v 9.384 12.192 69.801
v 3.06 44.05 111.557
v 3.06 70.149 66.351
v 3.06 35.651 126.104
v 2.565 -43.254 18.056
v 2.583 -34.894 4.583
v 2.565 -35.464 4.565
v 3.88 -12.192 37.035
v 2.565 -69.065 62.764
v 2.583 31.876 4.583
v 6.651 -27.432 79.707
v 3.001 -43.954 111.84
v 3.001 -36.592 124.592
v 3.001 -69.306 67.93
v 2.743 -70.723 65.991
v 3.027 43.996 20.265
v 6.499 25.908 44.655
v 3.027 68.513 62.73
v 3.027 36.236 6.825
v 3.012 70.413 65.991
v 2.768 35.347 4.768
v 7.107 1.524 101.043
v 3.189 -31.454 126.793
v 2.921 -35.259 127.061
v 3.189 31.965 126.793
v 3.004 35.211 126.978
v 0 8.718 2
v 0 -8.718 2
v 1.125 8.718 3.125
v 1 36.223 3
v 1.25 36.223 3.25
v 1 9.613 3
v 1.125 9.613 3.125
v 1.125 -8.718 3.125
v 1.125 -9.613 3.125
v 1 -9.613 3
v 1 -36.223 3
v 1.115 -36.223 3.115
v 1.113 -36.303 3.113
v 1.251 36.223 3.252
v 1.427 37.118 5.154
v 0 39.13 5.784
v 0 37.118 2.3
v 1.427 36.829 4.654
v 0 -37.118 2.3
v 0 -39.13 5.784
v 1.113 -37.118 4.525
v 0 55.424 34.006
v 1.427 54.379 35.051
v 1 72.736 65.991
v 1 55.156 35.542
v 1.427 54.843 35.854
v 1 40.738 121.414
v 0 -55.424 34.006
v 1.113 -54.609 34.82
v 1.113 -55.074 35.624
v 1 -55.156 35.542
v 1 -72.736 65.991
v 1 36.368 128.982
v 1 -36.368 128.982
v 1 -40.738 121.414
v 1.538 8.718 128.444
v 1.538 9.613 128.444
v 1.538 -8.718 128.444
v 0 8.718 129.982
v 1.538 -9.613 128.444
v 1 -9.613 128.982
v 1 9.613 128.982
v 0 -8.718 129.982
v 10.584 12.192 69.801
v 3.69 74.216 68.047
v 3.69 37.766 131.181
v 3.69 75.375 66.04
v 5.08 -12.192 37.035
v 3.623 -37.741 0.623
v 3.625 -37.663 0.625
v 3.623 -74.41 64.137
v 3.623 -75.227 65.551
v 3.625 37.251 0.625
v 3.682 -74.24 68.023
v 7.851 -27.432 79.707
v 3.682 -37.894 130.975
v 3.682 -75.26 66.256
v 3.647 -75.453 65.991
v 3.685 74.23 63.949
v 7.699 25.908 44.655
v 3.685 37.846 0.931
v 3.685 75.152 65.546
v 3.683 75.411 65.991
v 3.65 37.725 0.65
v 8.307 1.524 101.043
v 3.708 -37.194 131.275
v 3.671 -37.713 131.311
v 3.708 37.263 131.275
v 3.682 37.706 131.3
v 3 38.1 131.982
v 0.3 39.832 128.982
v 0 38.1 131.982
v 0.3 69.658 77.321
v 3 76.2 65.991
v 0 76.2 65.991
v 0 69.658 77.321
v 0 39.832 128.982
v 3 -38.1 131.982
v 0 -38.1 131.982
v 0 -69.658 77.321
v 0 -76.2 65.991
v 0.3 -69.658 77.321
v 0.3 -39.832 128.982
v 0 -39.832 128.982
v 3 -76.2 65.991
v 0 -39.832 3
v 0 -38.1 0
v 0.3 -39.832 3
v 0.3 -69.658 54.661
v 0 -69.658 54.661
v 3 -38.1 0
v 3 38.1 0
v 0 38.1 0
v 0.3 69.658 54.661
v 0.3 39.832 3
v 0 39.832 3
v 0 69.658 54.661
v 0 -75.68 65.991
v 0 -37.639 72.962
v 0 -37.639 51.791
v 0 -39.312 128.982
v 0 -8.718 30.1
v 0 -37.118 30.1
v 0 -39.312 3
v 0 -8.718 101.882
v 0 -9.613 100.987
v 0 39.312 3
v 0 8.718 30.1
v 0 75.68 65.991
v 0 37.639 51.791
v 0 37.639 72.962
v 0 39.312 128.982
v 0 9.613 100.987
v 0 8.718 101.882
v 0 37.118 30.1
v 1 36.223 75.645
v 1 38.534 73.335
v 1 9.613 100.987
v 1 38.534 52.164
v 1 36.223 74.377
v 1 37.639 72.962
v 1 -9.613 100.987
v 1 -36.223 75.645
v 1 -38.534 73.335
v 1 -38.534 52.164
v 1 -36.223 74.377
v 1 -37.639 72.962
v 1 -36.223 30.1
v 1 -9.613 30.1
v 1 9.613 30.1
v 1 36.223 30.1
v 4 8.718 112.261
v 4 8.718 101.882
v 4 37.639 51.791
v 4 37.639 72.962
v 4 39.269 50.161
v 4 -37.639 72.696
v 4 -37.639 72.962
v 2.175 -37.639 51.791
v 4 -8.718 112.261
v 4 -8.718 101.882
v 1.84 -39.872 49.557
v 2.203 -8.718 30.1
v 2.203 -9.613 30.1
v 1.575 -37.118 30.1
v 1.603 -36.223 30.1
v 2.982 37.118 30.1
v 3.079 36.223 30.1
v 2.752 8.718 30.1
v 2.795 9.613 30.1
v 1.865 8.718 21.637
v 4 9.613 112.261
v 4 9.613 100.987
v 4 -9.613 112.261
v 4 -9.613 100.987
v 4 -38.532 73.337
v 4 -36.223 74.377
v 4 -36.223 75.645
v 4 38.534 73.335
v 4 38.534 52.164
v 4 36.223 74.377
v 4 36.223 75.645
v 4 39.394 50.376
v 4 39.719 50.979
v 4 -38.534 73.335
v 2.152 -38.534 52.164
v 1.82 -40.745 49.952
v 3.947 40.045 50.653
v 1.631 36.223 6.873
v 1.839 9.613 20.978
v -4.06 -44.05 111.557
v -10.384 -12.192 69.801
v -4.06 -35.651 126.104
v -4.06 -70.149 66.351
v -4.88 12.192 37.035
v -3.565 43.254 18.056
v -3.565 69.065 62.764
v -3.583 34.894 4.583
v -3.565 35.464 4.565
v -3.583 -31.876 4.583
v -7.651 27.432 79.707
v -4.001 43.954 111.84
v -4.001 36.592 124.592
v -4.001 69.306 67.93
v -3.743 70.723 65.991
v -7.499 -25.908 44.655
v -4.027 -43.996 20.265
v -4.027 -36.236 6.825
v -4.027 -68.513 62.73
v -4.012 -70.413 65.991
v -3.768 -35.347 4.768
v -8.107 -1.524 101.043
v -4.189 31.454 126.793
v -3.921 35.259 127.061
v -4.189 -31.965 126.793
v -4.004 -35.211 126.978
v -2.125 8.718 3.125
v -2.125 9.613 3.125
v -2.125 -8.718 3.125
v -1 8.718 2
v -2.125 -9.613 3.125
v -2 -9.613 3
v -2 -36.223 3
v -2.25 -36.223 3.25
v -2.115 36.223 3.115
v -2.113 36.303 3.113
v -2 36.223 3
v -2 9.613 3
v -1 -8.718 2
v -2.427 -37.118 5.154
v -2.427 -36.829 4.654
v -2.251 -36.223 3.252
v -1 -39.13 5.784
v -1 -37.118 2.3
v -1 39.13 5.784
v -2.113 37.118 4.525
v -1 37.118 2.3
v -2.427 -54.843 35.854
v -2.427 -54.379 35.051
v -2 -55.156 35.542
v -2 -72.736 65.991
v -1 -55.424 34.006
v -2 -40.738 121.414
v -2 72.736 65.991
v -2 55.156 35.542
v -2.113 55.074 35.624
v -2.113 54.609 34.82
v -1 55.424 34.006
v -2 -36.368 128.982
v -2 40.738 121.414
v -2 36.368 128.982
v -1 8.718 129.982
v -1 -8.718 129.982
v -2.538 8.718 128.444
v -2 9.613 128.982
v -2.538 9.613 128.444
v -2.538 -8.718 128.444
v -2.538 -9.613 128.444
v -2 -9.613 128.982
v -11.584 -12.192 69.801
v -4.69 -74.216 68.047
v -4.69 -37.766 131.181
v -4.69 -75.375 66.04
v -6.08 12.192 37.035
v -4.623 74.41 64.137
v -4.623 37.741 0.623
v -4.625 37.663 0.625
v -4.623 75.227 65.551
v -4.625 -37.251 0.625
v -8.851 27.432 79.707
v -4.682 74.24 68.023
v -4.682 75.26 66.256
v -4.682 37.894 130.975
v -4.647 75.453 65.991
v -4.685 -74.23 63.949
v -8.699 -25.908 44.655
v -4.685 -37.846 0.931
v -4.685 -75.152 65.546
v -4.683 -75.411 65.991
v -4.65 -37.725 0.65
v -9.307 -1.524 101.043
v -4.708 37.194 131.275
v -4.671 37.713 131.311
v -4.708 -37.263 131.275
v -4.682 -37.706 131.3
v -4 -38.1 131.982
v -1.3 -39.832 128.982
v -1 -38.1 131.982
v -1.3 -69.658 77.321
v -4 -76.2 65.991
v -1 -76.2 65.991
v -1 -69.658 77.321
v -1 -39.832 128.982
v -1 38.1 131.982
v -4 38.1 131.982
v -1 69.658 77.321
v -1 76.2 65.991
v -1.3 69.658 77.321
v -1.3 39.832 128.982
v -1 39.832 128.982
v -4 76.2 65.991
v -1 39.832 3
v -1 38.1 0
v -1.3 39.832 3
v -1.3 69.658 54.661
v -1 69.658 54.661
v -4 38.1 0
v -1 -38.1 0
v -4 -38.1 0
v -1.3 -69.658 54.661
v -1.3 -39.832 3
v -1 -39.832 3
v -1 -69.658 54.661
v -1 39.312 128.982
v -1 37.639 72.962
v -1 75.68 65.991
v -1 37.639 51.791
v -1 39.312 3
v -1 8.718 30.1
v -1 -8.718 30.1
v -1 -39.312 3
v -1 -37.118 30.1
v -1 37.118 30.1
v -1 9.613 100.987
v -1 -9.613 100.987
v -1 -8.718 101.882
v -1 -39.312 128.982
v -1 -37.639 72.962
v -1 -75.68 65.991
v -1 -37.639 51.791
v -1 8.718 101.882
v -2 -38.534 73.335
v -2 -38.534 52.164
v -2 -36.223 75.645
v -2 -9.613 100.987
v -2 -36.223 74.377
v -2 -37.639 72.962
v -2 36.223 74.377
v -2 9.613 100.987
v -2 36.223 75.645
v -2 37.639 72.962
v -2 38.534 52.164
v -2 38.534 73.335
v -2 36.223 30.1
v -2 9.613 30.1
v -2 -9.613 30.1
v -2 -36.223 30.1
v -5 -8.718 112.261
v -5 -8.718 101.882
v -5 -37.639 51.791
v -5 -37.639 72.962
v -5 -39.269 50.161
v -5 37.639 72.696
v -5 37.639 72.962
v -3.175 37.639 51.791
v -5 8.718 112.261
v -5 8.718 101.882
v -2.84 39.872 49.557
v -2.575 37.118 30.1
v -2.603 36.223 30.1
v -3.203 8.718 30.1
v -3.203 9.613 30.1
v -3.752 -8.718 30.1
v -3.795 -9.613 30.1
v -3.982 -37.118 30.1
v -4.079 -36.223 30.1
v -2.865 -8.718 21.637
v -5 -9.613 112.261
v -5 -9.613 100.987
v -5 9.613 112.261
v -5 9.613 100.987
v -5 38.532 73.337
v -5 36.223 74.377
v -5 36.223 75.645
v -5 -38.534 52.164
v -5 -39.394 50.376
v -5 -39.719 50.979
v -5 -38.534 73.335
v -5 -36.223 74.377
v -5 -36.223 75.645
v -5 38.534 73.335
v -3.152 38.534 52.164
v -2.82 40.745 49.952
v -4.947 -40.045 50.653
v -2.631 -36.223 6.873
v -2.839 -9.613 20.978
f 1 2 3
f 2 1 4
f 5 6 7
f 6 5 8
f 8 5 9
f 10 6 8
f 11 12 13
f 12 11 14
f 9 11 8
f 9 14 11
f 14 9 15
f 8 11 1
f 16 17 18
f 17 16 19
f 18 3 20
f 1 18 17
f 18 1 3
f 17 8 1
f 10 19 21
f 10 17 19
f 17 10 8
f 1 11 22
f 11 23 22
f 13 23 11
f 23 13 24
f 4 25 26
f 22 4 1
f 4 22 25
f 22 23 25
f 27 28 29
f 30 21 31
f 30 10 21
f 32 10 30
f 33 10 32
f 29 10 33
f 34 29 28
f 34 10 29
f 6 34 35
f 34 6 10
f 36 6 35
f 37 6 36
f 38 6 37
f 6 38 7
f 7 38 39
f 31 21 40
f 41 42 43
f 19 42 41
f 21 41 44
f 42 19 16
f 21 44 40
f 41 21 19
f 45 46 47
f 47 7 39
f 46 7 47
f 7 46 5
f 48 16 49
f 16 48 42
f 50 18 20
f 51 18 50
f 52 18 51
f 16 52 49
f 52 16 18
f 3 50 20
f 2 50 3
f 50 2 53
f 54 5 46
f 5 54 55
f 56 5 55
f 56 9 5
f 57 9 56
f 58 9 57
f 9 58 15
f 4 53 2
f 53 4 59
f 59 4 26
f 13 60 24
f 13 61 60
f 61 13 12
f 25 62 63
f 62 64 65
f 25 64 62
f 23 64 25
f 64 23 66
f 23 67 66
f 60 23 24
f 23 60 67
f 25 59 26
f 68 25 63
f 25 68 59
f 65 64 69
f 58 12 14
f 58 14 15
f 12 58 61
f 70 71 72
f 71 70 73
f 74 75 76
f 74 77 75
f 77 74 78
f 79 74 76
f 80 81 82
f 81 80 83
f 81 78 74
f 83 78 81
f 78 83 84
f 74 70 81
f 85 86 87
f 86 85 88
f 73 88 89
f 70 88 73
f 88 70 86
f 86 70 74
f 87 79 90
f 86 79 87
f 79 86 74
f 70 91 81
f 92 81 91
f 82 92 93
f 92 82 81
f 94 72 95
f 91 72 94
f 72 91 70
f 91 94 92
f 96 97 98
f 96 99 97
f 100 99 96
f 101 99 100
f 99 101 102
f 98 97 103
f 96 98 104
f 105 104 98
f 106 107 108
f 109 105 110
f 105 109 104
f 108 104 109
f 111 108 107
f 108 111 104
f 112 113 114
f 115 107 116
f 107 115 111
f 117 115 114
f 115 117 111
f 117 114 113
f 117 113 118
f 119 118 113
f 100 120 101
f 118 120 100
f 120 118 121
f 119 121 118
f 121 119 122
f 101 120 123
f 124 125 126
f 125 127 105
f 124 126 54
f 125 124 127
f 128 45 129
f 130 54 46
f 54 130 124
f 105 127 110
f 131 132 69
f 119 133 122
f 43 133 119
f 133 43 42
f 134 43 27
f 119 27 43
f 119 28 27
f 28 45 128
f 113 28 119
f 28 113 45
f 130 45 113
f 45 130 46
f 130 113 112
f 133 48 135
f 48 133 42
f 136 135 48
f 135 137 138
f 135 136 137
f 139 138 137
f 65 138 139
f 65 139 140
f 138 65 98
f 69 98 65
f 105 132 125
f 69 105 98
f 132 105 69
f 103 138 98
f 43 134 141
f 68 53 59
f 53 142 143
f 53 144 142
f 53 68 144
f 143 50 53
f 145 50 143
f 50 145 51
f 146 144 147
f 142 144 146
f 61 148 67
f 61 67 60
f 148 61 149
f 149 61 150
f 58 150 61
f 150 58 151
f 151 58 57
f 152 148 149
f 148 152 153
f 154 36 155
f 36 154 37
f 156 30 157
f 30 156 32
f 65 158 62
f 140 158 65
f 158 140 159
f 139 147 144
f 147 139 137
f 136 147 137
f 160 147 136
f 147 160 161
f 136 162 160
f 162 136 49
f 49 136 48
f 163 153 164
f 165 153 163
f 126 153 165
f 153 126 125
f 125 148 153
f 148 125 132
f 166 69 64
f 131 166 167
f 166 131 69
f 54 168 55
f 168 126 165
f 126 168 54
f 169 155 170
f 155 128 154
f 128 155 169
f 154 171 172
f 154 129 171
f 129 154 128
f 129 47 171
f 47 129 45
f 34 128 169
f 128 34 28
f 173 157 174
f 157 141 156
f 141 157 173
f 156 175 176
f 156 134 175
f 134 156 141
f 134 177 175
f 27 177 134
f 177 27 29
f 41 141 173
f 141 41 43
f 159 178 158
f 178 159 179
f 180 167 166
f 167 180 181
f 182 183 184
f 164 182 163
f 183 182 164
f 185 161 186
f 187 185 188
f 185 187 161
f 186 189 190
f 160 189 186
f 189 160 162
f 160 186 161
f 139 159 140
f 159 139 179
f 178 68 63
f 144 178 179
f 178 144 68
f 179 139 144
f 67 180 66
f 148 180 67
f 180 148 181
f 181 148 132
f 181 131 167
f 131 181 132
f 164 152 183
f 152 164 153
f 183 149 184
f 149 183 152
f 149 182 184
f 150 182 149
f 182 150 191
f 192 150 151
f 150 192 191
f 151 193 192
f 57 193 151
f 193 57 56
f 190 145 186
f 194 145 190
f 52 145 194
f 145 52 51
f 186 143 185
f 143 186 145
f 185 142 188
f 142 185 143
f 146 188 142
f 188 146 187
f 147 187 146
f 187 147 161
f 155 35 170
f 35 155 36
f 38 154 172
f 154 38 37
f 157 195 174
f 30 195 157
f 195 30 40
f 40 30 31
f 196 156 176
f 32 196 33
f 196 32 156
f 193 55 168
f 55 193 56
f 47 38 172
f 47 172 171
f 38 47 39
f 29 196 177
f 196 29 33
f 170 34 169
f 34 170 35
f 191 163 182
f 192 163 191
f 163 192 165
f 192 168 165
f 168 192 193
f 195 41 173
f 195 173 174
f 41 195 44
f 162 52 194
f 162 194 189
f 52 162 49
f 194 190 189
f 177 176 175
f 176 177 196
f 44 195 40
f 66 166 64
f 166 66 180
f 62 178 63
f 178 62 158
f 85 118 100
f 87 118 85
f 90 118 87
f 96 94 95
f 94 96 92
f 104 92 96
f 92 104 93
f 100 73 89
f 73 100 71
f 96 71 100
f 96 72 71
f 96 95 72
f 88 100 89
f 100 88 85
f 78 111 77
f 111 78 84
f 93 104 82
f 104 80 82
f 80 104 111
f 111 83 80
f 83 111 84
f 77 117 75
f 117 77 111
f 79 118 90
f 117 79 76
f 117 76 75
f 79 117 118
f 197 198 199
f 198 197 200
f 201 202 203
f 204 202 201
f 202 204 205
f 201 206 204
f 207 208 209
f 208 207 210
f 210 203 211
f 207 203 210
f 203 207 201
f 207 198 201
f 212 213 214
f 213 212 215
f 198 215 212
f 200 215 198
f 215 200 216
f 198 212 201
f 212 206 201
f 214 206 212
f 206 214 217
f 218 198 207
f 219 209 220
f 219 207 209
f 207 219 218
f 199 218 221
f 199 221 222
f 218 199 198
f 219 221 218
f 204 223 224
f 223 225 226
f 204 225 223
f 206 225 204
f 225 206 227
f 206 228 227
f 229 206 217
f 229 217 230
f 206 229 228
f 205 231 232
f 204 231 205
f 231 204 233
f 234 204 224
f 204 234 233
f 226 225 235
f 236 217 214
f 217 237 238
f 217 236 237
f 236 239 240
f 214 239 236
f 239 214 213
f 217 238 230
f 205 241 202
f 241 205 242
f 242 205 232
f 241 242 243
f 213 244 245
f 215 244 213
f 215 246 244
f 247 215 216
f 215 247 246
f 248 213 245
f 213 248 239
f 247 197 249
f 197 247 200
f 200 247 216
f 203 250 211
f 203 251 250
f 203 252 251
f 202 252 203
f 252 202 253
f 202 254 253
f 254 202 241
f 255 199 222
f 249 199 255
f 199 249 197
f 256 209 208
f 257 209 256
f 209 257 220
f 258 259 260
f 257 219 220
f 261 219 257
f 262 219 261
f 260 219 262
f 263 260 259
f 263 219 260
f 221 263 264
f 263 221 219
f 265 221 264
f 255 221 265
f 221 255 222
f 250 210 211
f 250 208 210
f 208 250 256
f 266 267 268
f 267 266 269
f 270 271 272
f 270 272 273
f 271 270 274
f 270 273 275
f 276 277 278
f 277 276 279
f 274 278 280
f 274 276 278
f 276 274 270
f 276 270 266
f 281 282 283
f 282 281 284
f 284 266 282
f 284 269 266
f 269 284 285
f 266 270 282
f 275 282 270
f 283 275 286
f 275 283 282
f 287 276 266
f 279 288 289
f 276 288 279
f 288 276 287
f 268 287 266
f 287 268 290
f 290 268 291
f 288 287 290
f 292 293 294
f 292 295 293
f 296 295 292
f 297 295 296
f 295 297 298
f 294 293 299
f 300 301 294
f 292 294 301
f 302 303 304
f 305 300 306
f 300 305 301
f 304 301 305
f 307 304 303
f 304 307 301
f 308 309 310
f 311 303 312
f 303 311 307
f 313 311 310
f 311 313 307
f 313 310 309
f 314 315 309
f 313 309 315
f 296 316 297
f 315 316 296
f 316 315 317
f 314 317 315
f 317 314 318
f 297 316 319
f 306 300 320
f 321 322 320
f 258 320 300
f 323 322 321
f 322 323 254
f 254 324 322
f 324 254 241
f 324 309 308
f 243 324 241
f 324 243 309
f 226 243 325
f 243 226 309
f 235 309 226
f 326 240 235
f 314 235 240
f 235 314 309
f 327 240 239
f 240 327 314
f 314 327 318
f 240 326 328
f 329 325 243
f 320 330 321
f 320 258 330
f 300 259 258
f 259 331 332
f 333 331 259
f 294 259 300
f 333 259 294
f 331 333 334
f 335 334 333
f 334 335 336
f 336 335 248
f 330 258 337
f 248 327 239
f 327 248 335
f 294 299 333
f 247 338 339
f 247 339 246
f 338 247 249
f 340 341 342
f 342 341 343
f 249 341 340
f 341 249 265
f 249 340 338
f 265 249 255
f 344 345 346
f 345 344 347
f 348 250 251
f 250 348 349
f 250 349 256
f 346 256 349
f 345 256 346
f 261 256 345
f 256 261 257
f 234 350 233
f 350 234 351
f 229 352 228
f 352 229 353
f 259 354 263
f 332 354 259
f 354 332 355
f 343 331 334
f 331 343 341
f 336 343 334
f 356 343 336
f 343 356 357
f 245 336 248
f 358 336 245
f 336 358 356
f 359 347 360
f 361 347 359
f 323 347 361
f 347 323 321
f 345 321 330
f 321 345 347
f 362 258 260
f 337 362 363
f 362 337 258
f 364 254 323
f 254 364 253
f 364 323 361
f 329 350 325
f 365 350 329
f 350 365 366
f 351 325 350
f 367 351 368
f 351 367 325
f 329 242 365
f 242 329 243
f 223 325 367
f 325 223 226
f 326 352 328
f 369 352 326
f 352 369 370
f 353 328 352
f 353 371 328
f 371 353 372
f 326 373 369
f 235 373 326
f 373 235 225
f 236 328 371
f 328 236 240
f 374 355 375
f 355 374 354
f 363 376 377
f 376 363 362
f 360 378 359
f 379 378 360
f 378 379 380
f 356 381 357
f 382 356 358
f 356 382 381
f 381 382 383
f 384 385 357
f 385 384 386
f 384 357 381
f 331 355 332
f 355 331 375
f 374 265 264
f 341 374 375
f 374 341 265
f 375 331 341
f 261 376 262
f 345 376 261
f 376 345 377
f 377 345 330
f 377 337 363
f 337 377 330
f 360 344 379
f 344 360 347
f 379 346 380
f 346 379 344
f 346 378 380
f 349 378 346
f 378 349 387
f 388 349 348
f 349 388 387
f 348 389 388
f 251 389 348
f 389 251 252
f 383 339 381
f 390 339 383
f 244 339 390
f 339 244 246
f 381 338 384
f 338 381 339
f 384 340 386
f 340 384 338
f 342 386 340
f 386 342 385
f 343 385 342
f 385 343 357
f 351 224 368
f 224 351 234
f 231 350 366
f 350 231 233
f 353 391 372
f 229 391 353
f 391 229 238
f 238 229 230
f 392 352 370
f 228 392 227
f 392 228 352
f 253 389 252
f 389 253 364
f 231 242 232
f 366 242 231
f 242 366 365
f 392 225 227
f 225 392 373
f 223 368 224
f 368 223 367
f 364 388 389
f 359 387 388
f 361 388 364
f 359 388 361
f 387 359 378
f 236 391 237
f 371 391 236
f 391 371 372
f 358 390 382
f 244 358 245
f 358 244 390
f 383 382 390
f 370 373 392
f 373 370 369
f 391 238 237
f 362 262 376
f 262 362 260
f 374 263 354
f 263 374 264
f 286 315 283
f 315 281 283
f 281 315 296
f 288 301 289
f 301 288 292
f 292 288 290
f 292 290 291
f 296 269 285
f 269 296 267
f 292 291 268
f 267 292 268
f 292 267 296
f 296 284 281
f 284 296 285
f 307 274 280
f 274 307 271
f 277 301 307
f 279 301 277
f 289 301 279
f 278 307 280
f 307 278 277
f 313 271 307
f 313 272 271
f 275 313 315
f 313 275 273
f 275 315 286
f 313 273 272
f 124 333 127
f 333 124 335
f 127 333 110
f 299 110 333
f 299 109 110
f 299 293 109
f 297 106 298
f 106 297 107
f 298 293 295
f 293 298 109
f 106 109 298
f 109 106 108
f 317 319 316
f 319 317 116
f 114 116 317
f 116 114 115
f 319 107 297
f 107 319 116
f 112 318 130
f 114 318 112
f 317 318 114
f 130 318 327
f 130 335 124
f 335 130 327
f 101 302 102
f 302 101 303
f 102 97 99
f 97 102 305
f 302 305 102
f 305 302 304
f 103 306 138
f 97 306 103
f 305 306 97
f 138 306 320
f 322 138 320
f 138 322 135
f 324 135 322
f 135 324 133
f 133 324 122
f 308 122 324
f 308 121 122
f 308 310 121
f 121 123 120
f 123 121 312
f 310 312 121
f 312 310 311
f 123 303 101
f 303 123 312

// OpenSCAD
// Hexagon wall tile v48 — parametric rebuild of v30
// Front: identical low-poly facets to v30 (same facet angles at every size).
// Edge profile: identical on every size (edge depth, rim width) so tiles butt flush.
// Back: six corner pads for 1" (25 mm) double-sided mounting tape.
// v32: tape pads are flat plates hung from the rim with an air gap to the front skin.
// v33: thinner skin + thinner pads so the air gap is 1.4 mm even right at the edges
//      (v32 had only 0.8 mm there and showed marks along the slanted edges).
// v34: snap-off stabilizer fins behind the bottom edge so the tall, thin tile can't tip over
//      while printing. Break them off afterwards (bend sideways) and the back stays flat.
// v35: 0.6 mm 45° chamfer on the front edge (crisp, consistent shadow line between tiles; hides
//      first-layer squish and brim trim marks) + relief_scale to deepen the facets if wanted.
// v37: much smaller breakaway tabs (0.8 x 0.6 mm, every 8 mm) so the fins snap off easily.
// v38: full-height snap-off BRACE FRAME behind the tile: a thin hex ring + X/vertical bars,
//      1 mm behind the back, tied to the tile rim by tiny tabs all the way round (incl. the top).
//      Tile + brace act as a stiff box while printing; the fins now sit on the brace.
//      Peel the brace off after printing — the tabs only touch the back rim.
// v39: PAIR mode (default): two identical tiles printed back-to-back, 0.4 mm apart, so each
//      cradles the other full-height. Only 12 tiny tabs (corners + mid-sides) join the back
//      rims — twist/peel the tiles apart. No brace, no fins, almost no waste. The pair is
//      turned 90° on the bed so the 'back' seam lands on a side edge, not on either face.
// v40: pair tabs spaced evenly every ~pair_tab_pitch mm round the rim on EVERY size. In v39 the
//      tab spacing grew with the tile (3": ~23 mm max gap, 6": ~46 mm, 10": ~79 mm), so the 3" pair
//      printed perfectly but the 6" rims flexed apart between tabs and broke up above mid-height.
//      Now every size has the same tab spacing as a stiff 3" pair (or tighter).
// v42: tabs replaced by one continuous hairline SEAM round the outer edge of the pair gap.
//      Discrete tabs changed the toolpath on every layer that had a tab, leaving a faint line
//      across the tile every ~10 mm of height. With a continuous seam every layer has the same
//      shape, so there is nothing to print differently. Separate the tiles by running a utility
//      knife along the seam line on the edges, then twist apart.
// v43: stiffer tape pads — each pad now grows from the back plane toward the front until it is
//      pad_gap (1.4 mm) from the skin, instead of being a 1 mm plate (the skin stays untouched, so
//      no ghost lines). Larger tiles (>= mid_pad_min_in)
//      get four extra pads at the slanted mid-edges: 10 tape spots on the 10".
// v44: UNIFORM pads. Every pad is the same PAD x PAD tape square, pushed snug into its corner
//      (touching both rims), with only a small 45° gusset beneath it down to the rim so it prints
//      without support. Because a hex corner is the same angle at every size, the 6" and 10" pads
//      are identical in shape and size; the 3" uses the same layout with smaller squares.
//      The 10" adds the same square at the middle of each slanted edge.
// v46: pads are a 1 mm plate with a stiffening LIP round the free edges (like a shallow tray),
//      instead of solid-filled — nearly the stiffness of v44's deep pads at close to v42 print time.
// v47: pair gap 0.4 -> 1.0 mm. At 0.4 mm the squashed back walls of the two tiles touched and
//      fused, so v42-v46 pairs would not come apart. At 1.0 mm only the hairline edge seam joins
//      them: cut it with a utility knife (there is now room for the blade) and they separate.
// v48: seam only on the four SLANTED edges. The top and bottom flat edges are left open (a 1 mm
//      slot), so a putty knife / flat screwdriver can go in and pry the pair open, unzipping the
//      seam. Every layer still crosses the seam at both ends, so the layer shape stays constant.
// Prints upright on a flat edge with NO supports (every downward edge is 45° or steeper).
//
// Export one size at a time, e.g.:
//   openscad -D size_in=6 -o hex_pair_v48_6in.stl hex_wall_tile_v48.scad

/* [Size] */
size_in       = 6;      // point-to-point width in inches (3, 6, 10 ...)

/* [Edge profile — keep identical across sizes] */
// Space behind the skin at the edge = edge_depth - skin; it must be >= pad_plate + pad_gap + pad_recess.
edge_depth    = 3.6;    // depth of the outer edge, back plane to front face (mm)
rim           = 2.0;    // perimeter wall thickness at the back plane (mm)
front_chamfer = 0.6;    // 45° chamfer on the front edge (mm); 0 = sharp edge

/* [Look] */
relief_scale  = 1.0;    // 1.0 = v30 facets; 1.5 = 50% deeper facets (same edge profile on all sizes)

/* [Front skin] */
skin          = 1.2;    // front skin thickness (mm) — 3 lines at 0.4 mm, same on all sizes

/* [Tape pads] */
tape_width    = 25.4;   // tape width (mm)
pad_margin    = 3;      // extra pad width beyond the tape (mm)
pad_max_frac  = 0.45;   // pad never larger than this fraction of the tile radius (keeps 3" usable)
pad_plate     = 1.0;    // minimum pad thickness (mm) — at the very edge, where there is least room
pad_depth     = 4;      // stiffening lip depth (mm); always stops pad_gap from the skin
pad_lip       = 0.9;    // lip thickness (mm) — two lines
mid_pad_min_in = 8;     // tiles this size or larger also get pads at the four slanted mid-edges
pad_gap       = 1.4;    // minimum air gap between pads and the front skin (mm) — keeps the front clean
pad_recess    = 0;      // pads set back from the rim (mm); >0 lets the rim touch the wall,
                        // but near the edges the plate is then trimmed thinner to keep pad_gap

/* [Print stabilizers (snap off after printing)] */
stabilizers   = false;  // v34-v38 option; not needed in pair mode
fin_count     = 2;      // fins behind the bottom edge, placed symmetrically
fin_thick     = 1.6;    // fin thickness (mm)
fin_height_frac = 0.35; // fin height as a fraction of the tile height
fin_depth_frac  = 0.4;  // fin depth behind the brace as a fraction of fin height
fin_depth_min   = 15;   // (mm)
fin_gap       = 0.5;    // air gap between fin and tile back (mm)
tab_height    = 0.6;    // breakaway tab height (mm, vertical when printing) — 3 layers at 0.2
tab_width     = 0.8;    // breakaway tab width (mm), centred on the fin — 2 lines
tab_pitch     = 8;      // spacing between tabs (mm)

/* [Full-height brace frame (snap off after printing)] */
brace         = false;  // v38 option; not needed in pair mode
brace_gap     = 1.0;    // air gap between tile back and brace (mm)
brace_thick   = 1.6;    // brace thickness (mm)
brace_rim_w   = 4;      // width of the brace's hex ring (mm)
brace_bar_w   = 3;      // width of the X and vertical bars (mm)
brace_tab_pitch = 10;   // spacing of brace tabs along each rim side (mm)
brace_tab     = 0.8;    // brace tab size (mm) — tiny, so the brace peels off

/* [Back-to-back pair (default)] */
pair          = true;
pair_gap      = 1.0;    // gap between the two back planes (mm) — v47: 1.0 so the backs cannot fuse; the edge seam alone joins them
pair_tab      = 0.6;    // tab size (mm) — tiny, so the pair twists apart
pair_tab_pitch = 12;    // (v40 tabs, unused when pair_seam_w > 0)
pair_seam_w   = 0.45;   // width of the continuous edge seam bridging the gap (mm) — about one line
seam_open     = 3;      // leave the seam off this far from the top and bottom flat edges (mm) -> pry slots

/* [Output] */
orient_for_print = true; // stand upright on a flat edge, back facing +Y

/* [Hidden] */
R   = size_in * 25.4 / 2;         // corner radius
AP  = R * cos(30);                // apothem
PAD = min(tape_width + pad_margin, R * pad_max_frac);

// Normalised front geometry from v30 (x, y in units of R; z = relief above edge, units of R)
FP = [[1,0,0],[0.5,0.866025,0],[-0.5,0.866025,0],[-1,0,0],[-0.5,-0.866025,0],[0.5,-0.866025,0],
      [0.16,0.05,0.091654],[-0.16,-0.38,0.019428],[-0.36,0.18,0.05579],[0.34,-0.28,0.053795],[0.02,0.46,0.061766]];
FACES = [[0,6,1],[4,3,7],[5,4,7],[8,3,2],[7,3,8],[7,8,6],[5,9,0],[9,6,0],[9,7,6],[5,7,9],
         [6,8,10],[8,2,10],[6,10,1],[10,2,1],
         [1,12,11,0],[2,13,12,1],[3,14,13,2],[4,15,14,3],[5,16,15,4],[0,11,16,5],
         [11,12,13,14,15,16]];
RELIEF_MAX = 0.091654 * R * relief_scale;
D = edge_depth + RELIEF_MAX + 1;  // max depth used for chamfers

// Solid bounded by the faceted front (shifted by dz) and a flat back at z = zb
module body(dz = 0, zb = 0) {
    pts = concat(
        [for (p = FP) [p[0]*R, p[1]*R, edge_depth + p[2]*R*relief_scale + dz]],
        [for (i = [0:5]) [FP[i][0]*R, FP[i][1]*R, zb]]);
    polyhedron(points = pts, faces = FACES, convexity = 4);
}

module hex2d(apothem) { circle(r = apothem / cos(30), $fn = 6); }

// Back cavity: behind the skin, inside the rim; rim inner faces slope 45° so nothing needs support
module cavity(extra = 0) {
    H  = D + 2;
    a0 = AP - rim - extra + 1;             // apothem at z = -1
    intersection() {
        body(dz = -skin - extra, zb = -1);
        translate([0, 0, -1]) linear_extrude(height = H, scale = (a0 - H) / a0) hex2d(a0);
    }
}

// ---- Uniform tape pads ----------------------------------------------------------------
PA = AP - rim + 0.3;                    // inner apothem used for pads (0.3 mm overlap fuses them to the rim)
PH = PAD / 2;
function nrm(a) = [cos(a), sin(a)];
function lim(a) = PA - PH * (abs(cos(a)) + abs(sin(a)));     // max n.c for an axis-aligned PAD square
// centre of a PAD square snug in the corner at angle t (touches the two rims meeting there)
function corner_c(t) = let(n1 = nrm(t - 30), n2 = nrm(t + 30), b1 = lim(t - 30), b2 = lim(t + 30), d = sin(60))
    [(b1*n2[1] - b2*n1[1]) / d, (n1[0]*b2 - n2[0]*b1) / d];
// centre of a PAD square snug against the middle of the edge whose normal is at angle a
function edge_c(a) = lim(a) * nrm(a);
// downward 45° (or vertical) gusset direction toward the nearest rim below — printed upright, model -y is down
function gdir(t) = (cos(t) > 0.1) ? [1, -1] : (cos(t) < -0.1) ? [-1, -1] : [0, -1];

module pad_sq(c, dir) {
    intersection() {
        hex2d(PA);
        hull() { translate(c) square(PAD, center = true); translate(c + dir * R) square(PAD, center = true); }
    }
}
module pad_fp(k)  { t = 60*k;      pad_sq(corner_c(t), (k == 4 || k == 5) ? [0, -1] : gdir(t)); }
module mid_fp(k)  { a = 30 + 60*k; pad_sq(edge_c(a),   (k == 3 || k == 5) ? [0, -1] : gdir(a)); }

module pad_fps() {
    for (k = [0:5]) pad_fp(k);
    if (size_in >= mid_pad_min_in) for (k = [0, 2, 3, 5]) mid_fp(k);
}
module pads() {
    intersection() {
        body(dz = -skin - pad_gap, zb = -1);       // never closer than pad_gap to the skin
        translate([0, 0, pad_recess]) union() {
            linear_extrude(pad_plate) pad_fps();                      // flat tape plate
            linear_extrude(max(pad_plate, pad_depth))                 // lip round the side/lower edges
                difference() {                                        // (no lip along upward-facing edges:
                    pad_fps();                                        //  printed upright it would start in mid-air)
                    minkowski() { offset(delta = -pad_lip) pad_fps(); translate([-0.005, 0]) square([0.01, 2*R]); }
                }
        }
    }
}

module chamfer_clip() {
    HB = D + 5;
    union() {
        translate([0, 0, -2]) linear_extrude(edge_depth - front_chamfer + 2) hex2d(AP + 1);
        translate([0, 0, edge_depth - front_chamfer]) linear_extrude(height = HB, scale = (AP - HB) / AP) hex2d(AP);
    }
}

module tile() {
    intersection() {
        union() {
            difference() { body(); cavity(); }
            pads();
        }
        if (front_chamfer > 0) chamfer_clip(); else translate([-2*R, -2*R, -5]) cube([4*R, 4*R, 4*R]);
    }
}

// Triangular fins standing on the bed behind the back (model z < 0), joined to the tile by small tabs
FIN_H = fin_height_frac * 2 * AP;
FIN_L = max(fin_depth_min, fin_depth_frac * FIN_H);
function fin_x(i) = (fin_count == 1) ? 0 : (-1 + 2 * i / (fin_count - 1)) * 0.35 * R;
BZ = brace ? brace_gap + brace_thick : 0;          // fins start behind the brace when it is used
module stabilizer_fins() {
    for (i = [0 : fin_count - 1]) {
        x = fin_x(i);
        fg = brace ? BZ - 0.3 : fin_gap;                // with a brace: fused into it (no tabs needed)
        hull() {                                            // fin: vertical triangle
            translate([x - fin_thick/2, -AP, -fg - FIN_L]) cube([fin_thick, 0.01, FIN_L]);
            translate([x - fin_thick/2, -AP, -fg - 0.01]) cube([fin_thick, FIN_H, 0.01]);
        }
        if (!brace)
            for (y = [0 : tab_pitch : FIN_H - tab_height])  // breakaway tabs into the back plane
                translate([x - tab_width/2, -AP + y, -fin_gap - 0.05]) cube([tab_width, tab_height, fin_gap + 0.35]);
    }
}

// Brace frame (2D, in the tile plane). Printed upright, so every downward-facing edge is >= 45°:
// the top bar is carried by 45° roofs in the two top windows; bars run vertical or at ±60°.
module brace_2d() {
    W  = brace_rim_w;
    Yt = AP - W;                                        // underside of the top ring bar
    difference() {
        hex2d(AP);
        intersection() {                                // the open window, with a 45° roof under the top bar
            hex2d(AP - W);
            // only the two top windows touch the top bar: give them a 45° valley roof
            polygon([[-2*R, -2*R], [2*R, -2*R], [2*R, 2*R], [R/2, 2*R], [R/2, Yt],
                     [0, Yt - R/2], [-R/2, Yt], [-R/2, 2*R], [-2*R, 2*R]]);
        }
    }
    intersection() {
        hex2d(AP);
        union() {
            square([brace_bar_w, 2*AP], center = true);                 // vertical bar
            rotate(60)  square([4*R, brace_bar_w], center = true);      // ±60° diagonals (corner to corner)
            rotate(-60) square([4*R, brace_bar_w], center = true);
        }
    }
}

module brace_frame() {
    translate([0, 0, -BZ]) linear_extrude(brace_thick) brace_2d();
    // tiny tabs across the gap, on the tile's back rim (1 mm in from the outline), all six sides
    for (k = [0:5]) {
        a0 = 60*k; a1 = 60*(k+1);
        p0 = [ (R - 1/sin(60)) * cos(a0), (R - 1/sin(60)) * sin(a0) ];
        p1 = [ (R - 1/sin(60)) * cos(a1), (R - 1/sin(60)) * sin(a1) ];
        L  = norm(p1 - p0);
        n  = floor((L - 6) / brace_tab_pitch);
        for (j = [0 : n]) {
            t = (3 + j * (L - 6) / max(n, 1)) / L;
            p = p0 + t * (p1 - p0);
            translate([p[0], p[1], -brace_gap - 0.3]) rotate(a0 + 120)
                translate([-brace_tab/2, -brace_tab/2, 0]) cube([brace_tab, brace_tab, brace_gap + 0.6]);
        }
    }
}

// Tabs across the pair gap, evenly spaced along each rim side (1 mm in from the outline)
module pair_tabs() {
    rr = R - 1/sin(60);
    n  = max(2, ceil(rr / pair_tab_pitch));          // side length = rr
    for (k = [0:5]) for (i = [0:n-1]) {
        f  = (i + 0.5) / n;
        a0 = 60*k; a1 = 60*(k+1);
        p = [rr*cos(a0), rr*sin(a0)] + f * ([rr*cos(a1), rr*sin(a1)] - [rr*cos(a0), rr*sin(a0)]);
        translate([p[0], p[1], -pair_gap - 0.3]) rotate(a0 + 120)
            translate([-pair_tab/2, -pair_tab/2, 0]) cube([pair_tab, pair_tab, pair_gap + 0.6]);
    }
}
// Continuous hairline seam round the outline, bridging the gap between the two back planes
module pair_seam() {
    translate([0, 0, -pair_gap - 0.3]) linear_extrude(pair_gap + 0.6)
        intersection() {
            difference() { hex2d(AP); hex2d(AP - pair_seam_w); }
            square([4*R, 2*(AP - seam_open)], center = true);   // slanted edges only
        }
}
module partner() { translate([0, 0, -pair_gap]) rotate([0, 180, 0]) tile(); }   // same tile turned round, not mirrored

module assembly() {
    tile();
    if (pair) { partner(); if (pair_seam_w > 0) pair_seam(); else pair_tabs(); }
    else { if (brace) brace_frame(); if (stabilizers) stabilizer_fins(); }
}

if (orient_for_print)
    rotate([0, 0, pair ? 90 : 0]) translate([0, 0, AP]) rotate([90, 0, 0]) assembly();
else
    assembly();
